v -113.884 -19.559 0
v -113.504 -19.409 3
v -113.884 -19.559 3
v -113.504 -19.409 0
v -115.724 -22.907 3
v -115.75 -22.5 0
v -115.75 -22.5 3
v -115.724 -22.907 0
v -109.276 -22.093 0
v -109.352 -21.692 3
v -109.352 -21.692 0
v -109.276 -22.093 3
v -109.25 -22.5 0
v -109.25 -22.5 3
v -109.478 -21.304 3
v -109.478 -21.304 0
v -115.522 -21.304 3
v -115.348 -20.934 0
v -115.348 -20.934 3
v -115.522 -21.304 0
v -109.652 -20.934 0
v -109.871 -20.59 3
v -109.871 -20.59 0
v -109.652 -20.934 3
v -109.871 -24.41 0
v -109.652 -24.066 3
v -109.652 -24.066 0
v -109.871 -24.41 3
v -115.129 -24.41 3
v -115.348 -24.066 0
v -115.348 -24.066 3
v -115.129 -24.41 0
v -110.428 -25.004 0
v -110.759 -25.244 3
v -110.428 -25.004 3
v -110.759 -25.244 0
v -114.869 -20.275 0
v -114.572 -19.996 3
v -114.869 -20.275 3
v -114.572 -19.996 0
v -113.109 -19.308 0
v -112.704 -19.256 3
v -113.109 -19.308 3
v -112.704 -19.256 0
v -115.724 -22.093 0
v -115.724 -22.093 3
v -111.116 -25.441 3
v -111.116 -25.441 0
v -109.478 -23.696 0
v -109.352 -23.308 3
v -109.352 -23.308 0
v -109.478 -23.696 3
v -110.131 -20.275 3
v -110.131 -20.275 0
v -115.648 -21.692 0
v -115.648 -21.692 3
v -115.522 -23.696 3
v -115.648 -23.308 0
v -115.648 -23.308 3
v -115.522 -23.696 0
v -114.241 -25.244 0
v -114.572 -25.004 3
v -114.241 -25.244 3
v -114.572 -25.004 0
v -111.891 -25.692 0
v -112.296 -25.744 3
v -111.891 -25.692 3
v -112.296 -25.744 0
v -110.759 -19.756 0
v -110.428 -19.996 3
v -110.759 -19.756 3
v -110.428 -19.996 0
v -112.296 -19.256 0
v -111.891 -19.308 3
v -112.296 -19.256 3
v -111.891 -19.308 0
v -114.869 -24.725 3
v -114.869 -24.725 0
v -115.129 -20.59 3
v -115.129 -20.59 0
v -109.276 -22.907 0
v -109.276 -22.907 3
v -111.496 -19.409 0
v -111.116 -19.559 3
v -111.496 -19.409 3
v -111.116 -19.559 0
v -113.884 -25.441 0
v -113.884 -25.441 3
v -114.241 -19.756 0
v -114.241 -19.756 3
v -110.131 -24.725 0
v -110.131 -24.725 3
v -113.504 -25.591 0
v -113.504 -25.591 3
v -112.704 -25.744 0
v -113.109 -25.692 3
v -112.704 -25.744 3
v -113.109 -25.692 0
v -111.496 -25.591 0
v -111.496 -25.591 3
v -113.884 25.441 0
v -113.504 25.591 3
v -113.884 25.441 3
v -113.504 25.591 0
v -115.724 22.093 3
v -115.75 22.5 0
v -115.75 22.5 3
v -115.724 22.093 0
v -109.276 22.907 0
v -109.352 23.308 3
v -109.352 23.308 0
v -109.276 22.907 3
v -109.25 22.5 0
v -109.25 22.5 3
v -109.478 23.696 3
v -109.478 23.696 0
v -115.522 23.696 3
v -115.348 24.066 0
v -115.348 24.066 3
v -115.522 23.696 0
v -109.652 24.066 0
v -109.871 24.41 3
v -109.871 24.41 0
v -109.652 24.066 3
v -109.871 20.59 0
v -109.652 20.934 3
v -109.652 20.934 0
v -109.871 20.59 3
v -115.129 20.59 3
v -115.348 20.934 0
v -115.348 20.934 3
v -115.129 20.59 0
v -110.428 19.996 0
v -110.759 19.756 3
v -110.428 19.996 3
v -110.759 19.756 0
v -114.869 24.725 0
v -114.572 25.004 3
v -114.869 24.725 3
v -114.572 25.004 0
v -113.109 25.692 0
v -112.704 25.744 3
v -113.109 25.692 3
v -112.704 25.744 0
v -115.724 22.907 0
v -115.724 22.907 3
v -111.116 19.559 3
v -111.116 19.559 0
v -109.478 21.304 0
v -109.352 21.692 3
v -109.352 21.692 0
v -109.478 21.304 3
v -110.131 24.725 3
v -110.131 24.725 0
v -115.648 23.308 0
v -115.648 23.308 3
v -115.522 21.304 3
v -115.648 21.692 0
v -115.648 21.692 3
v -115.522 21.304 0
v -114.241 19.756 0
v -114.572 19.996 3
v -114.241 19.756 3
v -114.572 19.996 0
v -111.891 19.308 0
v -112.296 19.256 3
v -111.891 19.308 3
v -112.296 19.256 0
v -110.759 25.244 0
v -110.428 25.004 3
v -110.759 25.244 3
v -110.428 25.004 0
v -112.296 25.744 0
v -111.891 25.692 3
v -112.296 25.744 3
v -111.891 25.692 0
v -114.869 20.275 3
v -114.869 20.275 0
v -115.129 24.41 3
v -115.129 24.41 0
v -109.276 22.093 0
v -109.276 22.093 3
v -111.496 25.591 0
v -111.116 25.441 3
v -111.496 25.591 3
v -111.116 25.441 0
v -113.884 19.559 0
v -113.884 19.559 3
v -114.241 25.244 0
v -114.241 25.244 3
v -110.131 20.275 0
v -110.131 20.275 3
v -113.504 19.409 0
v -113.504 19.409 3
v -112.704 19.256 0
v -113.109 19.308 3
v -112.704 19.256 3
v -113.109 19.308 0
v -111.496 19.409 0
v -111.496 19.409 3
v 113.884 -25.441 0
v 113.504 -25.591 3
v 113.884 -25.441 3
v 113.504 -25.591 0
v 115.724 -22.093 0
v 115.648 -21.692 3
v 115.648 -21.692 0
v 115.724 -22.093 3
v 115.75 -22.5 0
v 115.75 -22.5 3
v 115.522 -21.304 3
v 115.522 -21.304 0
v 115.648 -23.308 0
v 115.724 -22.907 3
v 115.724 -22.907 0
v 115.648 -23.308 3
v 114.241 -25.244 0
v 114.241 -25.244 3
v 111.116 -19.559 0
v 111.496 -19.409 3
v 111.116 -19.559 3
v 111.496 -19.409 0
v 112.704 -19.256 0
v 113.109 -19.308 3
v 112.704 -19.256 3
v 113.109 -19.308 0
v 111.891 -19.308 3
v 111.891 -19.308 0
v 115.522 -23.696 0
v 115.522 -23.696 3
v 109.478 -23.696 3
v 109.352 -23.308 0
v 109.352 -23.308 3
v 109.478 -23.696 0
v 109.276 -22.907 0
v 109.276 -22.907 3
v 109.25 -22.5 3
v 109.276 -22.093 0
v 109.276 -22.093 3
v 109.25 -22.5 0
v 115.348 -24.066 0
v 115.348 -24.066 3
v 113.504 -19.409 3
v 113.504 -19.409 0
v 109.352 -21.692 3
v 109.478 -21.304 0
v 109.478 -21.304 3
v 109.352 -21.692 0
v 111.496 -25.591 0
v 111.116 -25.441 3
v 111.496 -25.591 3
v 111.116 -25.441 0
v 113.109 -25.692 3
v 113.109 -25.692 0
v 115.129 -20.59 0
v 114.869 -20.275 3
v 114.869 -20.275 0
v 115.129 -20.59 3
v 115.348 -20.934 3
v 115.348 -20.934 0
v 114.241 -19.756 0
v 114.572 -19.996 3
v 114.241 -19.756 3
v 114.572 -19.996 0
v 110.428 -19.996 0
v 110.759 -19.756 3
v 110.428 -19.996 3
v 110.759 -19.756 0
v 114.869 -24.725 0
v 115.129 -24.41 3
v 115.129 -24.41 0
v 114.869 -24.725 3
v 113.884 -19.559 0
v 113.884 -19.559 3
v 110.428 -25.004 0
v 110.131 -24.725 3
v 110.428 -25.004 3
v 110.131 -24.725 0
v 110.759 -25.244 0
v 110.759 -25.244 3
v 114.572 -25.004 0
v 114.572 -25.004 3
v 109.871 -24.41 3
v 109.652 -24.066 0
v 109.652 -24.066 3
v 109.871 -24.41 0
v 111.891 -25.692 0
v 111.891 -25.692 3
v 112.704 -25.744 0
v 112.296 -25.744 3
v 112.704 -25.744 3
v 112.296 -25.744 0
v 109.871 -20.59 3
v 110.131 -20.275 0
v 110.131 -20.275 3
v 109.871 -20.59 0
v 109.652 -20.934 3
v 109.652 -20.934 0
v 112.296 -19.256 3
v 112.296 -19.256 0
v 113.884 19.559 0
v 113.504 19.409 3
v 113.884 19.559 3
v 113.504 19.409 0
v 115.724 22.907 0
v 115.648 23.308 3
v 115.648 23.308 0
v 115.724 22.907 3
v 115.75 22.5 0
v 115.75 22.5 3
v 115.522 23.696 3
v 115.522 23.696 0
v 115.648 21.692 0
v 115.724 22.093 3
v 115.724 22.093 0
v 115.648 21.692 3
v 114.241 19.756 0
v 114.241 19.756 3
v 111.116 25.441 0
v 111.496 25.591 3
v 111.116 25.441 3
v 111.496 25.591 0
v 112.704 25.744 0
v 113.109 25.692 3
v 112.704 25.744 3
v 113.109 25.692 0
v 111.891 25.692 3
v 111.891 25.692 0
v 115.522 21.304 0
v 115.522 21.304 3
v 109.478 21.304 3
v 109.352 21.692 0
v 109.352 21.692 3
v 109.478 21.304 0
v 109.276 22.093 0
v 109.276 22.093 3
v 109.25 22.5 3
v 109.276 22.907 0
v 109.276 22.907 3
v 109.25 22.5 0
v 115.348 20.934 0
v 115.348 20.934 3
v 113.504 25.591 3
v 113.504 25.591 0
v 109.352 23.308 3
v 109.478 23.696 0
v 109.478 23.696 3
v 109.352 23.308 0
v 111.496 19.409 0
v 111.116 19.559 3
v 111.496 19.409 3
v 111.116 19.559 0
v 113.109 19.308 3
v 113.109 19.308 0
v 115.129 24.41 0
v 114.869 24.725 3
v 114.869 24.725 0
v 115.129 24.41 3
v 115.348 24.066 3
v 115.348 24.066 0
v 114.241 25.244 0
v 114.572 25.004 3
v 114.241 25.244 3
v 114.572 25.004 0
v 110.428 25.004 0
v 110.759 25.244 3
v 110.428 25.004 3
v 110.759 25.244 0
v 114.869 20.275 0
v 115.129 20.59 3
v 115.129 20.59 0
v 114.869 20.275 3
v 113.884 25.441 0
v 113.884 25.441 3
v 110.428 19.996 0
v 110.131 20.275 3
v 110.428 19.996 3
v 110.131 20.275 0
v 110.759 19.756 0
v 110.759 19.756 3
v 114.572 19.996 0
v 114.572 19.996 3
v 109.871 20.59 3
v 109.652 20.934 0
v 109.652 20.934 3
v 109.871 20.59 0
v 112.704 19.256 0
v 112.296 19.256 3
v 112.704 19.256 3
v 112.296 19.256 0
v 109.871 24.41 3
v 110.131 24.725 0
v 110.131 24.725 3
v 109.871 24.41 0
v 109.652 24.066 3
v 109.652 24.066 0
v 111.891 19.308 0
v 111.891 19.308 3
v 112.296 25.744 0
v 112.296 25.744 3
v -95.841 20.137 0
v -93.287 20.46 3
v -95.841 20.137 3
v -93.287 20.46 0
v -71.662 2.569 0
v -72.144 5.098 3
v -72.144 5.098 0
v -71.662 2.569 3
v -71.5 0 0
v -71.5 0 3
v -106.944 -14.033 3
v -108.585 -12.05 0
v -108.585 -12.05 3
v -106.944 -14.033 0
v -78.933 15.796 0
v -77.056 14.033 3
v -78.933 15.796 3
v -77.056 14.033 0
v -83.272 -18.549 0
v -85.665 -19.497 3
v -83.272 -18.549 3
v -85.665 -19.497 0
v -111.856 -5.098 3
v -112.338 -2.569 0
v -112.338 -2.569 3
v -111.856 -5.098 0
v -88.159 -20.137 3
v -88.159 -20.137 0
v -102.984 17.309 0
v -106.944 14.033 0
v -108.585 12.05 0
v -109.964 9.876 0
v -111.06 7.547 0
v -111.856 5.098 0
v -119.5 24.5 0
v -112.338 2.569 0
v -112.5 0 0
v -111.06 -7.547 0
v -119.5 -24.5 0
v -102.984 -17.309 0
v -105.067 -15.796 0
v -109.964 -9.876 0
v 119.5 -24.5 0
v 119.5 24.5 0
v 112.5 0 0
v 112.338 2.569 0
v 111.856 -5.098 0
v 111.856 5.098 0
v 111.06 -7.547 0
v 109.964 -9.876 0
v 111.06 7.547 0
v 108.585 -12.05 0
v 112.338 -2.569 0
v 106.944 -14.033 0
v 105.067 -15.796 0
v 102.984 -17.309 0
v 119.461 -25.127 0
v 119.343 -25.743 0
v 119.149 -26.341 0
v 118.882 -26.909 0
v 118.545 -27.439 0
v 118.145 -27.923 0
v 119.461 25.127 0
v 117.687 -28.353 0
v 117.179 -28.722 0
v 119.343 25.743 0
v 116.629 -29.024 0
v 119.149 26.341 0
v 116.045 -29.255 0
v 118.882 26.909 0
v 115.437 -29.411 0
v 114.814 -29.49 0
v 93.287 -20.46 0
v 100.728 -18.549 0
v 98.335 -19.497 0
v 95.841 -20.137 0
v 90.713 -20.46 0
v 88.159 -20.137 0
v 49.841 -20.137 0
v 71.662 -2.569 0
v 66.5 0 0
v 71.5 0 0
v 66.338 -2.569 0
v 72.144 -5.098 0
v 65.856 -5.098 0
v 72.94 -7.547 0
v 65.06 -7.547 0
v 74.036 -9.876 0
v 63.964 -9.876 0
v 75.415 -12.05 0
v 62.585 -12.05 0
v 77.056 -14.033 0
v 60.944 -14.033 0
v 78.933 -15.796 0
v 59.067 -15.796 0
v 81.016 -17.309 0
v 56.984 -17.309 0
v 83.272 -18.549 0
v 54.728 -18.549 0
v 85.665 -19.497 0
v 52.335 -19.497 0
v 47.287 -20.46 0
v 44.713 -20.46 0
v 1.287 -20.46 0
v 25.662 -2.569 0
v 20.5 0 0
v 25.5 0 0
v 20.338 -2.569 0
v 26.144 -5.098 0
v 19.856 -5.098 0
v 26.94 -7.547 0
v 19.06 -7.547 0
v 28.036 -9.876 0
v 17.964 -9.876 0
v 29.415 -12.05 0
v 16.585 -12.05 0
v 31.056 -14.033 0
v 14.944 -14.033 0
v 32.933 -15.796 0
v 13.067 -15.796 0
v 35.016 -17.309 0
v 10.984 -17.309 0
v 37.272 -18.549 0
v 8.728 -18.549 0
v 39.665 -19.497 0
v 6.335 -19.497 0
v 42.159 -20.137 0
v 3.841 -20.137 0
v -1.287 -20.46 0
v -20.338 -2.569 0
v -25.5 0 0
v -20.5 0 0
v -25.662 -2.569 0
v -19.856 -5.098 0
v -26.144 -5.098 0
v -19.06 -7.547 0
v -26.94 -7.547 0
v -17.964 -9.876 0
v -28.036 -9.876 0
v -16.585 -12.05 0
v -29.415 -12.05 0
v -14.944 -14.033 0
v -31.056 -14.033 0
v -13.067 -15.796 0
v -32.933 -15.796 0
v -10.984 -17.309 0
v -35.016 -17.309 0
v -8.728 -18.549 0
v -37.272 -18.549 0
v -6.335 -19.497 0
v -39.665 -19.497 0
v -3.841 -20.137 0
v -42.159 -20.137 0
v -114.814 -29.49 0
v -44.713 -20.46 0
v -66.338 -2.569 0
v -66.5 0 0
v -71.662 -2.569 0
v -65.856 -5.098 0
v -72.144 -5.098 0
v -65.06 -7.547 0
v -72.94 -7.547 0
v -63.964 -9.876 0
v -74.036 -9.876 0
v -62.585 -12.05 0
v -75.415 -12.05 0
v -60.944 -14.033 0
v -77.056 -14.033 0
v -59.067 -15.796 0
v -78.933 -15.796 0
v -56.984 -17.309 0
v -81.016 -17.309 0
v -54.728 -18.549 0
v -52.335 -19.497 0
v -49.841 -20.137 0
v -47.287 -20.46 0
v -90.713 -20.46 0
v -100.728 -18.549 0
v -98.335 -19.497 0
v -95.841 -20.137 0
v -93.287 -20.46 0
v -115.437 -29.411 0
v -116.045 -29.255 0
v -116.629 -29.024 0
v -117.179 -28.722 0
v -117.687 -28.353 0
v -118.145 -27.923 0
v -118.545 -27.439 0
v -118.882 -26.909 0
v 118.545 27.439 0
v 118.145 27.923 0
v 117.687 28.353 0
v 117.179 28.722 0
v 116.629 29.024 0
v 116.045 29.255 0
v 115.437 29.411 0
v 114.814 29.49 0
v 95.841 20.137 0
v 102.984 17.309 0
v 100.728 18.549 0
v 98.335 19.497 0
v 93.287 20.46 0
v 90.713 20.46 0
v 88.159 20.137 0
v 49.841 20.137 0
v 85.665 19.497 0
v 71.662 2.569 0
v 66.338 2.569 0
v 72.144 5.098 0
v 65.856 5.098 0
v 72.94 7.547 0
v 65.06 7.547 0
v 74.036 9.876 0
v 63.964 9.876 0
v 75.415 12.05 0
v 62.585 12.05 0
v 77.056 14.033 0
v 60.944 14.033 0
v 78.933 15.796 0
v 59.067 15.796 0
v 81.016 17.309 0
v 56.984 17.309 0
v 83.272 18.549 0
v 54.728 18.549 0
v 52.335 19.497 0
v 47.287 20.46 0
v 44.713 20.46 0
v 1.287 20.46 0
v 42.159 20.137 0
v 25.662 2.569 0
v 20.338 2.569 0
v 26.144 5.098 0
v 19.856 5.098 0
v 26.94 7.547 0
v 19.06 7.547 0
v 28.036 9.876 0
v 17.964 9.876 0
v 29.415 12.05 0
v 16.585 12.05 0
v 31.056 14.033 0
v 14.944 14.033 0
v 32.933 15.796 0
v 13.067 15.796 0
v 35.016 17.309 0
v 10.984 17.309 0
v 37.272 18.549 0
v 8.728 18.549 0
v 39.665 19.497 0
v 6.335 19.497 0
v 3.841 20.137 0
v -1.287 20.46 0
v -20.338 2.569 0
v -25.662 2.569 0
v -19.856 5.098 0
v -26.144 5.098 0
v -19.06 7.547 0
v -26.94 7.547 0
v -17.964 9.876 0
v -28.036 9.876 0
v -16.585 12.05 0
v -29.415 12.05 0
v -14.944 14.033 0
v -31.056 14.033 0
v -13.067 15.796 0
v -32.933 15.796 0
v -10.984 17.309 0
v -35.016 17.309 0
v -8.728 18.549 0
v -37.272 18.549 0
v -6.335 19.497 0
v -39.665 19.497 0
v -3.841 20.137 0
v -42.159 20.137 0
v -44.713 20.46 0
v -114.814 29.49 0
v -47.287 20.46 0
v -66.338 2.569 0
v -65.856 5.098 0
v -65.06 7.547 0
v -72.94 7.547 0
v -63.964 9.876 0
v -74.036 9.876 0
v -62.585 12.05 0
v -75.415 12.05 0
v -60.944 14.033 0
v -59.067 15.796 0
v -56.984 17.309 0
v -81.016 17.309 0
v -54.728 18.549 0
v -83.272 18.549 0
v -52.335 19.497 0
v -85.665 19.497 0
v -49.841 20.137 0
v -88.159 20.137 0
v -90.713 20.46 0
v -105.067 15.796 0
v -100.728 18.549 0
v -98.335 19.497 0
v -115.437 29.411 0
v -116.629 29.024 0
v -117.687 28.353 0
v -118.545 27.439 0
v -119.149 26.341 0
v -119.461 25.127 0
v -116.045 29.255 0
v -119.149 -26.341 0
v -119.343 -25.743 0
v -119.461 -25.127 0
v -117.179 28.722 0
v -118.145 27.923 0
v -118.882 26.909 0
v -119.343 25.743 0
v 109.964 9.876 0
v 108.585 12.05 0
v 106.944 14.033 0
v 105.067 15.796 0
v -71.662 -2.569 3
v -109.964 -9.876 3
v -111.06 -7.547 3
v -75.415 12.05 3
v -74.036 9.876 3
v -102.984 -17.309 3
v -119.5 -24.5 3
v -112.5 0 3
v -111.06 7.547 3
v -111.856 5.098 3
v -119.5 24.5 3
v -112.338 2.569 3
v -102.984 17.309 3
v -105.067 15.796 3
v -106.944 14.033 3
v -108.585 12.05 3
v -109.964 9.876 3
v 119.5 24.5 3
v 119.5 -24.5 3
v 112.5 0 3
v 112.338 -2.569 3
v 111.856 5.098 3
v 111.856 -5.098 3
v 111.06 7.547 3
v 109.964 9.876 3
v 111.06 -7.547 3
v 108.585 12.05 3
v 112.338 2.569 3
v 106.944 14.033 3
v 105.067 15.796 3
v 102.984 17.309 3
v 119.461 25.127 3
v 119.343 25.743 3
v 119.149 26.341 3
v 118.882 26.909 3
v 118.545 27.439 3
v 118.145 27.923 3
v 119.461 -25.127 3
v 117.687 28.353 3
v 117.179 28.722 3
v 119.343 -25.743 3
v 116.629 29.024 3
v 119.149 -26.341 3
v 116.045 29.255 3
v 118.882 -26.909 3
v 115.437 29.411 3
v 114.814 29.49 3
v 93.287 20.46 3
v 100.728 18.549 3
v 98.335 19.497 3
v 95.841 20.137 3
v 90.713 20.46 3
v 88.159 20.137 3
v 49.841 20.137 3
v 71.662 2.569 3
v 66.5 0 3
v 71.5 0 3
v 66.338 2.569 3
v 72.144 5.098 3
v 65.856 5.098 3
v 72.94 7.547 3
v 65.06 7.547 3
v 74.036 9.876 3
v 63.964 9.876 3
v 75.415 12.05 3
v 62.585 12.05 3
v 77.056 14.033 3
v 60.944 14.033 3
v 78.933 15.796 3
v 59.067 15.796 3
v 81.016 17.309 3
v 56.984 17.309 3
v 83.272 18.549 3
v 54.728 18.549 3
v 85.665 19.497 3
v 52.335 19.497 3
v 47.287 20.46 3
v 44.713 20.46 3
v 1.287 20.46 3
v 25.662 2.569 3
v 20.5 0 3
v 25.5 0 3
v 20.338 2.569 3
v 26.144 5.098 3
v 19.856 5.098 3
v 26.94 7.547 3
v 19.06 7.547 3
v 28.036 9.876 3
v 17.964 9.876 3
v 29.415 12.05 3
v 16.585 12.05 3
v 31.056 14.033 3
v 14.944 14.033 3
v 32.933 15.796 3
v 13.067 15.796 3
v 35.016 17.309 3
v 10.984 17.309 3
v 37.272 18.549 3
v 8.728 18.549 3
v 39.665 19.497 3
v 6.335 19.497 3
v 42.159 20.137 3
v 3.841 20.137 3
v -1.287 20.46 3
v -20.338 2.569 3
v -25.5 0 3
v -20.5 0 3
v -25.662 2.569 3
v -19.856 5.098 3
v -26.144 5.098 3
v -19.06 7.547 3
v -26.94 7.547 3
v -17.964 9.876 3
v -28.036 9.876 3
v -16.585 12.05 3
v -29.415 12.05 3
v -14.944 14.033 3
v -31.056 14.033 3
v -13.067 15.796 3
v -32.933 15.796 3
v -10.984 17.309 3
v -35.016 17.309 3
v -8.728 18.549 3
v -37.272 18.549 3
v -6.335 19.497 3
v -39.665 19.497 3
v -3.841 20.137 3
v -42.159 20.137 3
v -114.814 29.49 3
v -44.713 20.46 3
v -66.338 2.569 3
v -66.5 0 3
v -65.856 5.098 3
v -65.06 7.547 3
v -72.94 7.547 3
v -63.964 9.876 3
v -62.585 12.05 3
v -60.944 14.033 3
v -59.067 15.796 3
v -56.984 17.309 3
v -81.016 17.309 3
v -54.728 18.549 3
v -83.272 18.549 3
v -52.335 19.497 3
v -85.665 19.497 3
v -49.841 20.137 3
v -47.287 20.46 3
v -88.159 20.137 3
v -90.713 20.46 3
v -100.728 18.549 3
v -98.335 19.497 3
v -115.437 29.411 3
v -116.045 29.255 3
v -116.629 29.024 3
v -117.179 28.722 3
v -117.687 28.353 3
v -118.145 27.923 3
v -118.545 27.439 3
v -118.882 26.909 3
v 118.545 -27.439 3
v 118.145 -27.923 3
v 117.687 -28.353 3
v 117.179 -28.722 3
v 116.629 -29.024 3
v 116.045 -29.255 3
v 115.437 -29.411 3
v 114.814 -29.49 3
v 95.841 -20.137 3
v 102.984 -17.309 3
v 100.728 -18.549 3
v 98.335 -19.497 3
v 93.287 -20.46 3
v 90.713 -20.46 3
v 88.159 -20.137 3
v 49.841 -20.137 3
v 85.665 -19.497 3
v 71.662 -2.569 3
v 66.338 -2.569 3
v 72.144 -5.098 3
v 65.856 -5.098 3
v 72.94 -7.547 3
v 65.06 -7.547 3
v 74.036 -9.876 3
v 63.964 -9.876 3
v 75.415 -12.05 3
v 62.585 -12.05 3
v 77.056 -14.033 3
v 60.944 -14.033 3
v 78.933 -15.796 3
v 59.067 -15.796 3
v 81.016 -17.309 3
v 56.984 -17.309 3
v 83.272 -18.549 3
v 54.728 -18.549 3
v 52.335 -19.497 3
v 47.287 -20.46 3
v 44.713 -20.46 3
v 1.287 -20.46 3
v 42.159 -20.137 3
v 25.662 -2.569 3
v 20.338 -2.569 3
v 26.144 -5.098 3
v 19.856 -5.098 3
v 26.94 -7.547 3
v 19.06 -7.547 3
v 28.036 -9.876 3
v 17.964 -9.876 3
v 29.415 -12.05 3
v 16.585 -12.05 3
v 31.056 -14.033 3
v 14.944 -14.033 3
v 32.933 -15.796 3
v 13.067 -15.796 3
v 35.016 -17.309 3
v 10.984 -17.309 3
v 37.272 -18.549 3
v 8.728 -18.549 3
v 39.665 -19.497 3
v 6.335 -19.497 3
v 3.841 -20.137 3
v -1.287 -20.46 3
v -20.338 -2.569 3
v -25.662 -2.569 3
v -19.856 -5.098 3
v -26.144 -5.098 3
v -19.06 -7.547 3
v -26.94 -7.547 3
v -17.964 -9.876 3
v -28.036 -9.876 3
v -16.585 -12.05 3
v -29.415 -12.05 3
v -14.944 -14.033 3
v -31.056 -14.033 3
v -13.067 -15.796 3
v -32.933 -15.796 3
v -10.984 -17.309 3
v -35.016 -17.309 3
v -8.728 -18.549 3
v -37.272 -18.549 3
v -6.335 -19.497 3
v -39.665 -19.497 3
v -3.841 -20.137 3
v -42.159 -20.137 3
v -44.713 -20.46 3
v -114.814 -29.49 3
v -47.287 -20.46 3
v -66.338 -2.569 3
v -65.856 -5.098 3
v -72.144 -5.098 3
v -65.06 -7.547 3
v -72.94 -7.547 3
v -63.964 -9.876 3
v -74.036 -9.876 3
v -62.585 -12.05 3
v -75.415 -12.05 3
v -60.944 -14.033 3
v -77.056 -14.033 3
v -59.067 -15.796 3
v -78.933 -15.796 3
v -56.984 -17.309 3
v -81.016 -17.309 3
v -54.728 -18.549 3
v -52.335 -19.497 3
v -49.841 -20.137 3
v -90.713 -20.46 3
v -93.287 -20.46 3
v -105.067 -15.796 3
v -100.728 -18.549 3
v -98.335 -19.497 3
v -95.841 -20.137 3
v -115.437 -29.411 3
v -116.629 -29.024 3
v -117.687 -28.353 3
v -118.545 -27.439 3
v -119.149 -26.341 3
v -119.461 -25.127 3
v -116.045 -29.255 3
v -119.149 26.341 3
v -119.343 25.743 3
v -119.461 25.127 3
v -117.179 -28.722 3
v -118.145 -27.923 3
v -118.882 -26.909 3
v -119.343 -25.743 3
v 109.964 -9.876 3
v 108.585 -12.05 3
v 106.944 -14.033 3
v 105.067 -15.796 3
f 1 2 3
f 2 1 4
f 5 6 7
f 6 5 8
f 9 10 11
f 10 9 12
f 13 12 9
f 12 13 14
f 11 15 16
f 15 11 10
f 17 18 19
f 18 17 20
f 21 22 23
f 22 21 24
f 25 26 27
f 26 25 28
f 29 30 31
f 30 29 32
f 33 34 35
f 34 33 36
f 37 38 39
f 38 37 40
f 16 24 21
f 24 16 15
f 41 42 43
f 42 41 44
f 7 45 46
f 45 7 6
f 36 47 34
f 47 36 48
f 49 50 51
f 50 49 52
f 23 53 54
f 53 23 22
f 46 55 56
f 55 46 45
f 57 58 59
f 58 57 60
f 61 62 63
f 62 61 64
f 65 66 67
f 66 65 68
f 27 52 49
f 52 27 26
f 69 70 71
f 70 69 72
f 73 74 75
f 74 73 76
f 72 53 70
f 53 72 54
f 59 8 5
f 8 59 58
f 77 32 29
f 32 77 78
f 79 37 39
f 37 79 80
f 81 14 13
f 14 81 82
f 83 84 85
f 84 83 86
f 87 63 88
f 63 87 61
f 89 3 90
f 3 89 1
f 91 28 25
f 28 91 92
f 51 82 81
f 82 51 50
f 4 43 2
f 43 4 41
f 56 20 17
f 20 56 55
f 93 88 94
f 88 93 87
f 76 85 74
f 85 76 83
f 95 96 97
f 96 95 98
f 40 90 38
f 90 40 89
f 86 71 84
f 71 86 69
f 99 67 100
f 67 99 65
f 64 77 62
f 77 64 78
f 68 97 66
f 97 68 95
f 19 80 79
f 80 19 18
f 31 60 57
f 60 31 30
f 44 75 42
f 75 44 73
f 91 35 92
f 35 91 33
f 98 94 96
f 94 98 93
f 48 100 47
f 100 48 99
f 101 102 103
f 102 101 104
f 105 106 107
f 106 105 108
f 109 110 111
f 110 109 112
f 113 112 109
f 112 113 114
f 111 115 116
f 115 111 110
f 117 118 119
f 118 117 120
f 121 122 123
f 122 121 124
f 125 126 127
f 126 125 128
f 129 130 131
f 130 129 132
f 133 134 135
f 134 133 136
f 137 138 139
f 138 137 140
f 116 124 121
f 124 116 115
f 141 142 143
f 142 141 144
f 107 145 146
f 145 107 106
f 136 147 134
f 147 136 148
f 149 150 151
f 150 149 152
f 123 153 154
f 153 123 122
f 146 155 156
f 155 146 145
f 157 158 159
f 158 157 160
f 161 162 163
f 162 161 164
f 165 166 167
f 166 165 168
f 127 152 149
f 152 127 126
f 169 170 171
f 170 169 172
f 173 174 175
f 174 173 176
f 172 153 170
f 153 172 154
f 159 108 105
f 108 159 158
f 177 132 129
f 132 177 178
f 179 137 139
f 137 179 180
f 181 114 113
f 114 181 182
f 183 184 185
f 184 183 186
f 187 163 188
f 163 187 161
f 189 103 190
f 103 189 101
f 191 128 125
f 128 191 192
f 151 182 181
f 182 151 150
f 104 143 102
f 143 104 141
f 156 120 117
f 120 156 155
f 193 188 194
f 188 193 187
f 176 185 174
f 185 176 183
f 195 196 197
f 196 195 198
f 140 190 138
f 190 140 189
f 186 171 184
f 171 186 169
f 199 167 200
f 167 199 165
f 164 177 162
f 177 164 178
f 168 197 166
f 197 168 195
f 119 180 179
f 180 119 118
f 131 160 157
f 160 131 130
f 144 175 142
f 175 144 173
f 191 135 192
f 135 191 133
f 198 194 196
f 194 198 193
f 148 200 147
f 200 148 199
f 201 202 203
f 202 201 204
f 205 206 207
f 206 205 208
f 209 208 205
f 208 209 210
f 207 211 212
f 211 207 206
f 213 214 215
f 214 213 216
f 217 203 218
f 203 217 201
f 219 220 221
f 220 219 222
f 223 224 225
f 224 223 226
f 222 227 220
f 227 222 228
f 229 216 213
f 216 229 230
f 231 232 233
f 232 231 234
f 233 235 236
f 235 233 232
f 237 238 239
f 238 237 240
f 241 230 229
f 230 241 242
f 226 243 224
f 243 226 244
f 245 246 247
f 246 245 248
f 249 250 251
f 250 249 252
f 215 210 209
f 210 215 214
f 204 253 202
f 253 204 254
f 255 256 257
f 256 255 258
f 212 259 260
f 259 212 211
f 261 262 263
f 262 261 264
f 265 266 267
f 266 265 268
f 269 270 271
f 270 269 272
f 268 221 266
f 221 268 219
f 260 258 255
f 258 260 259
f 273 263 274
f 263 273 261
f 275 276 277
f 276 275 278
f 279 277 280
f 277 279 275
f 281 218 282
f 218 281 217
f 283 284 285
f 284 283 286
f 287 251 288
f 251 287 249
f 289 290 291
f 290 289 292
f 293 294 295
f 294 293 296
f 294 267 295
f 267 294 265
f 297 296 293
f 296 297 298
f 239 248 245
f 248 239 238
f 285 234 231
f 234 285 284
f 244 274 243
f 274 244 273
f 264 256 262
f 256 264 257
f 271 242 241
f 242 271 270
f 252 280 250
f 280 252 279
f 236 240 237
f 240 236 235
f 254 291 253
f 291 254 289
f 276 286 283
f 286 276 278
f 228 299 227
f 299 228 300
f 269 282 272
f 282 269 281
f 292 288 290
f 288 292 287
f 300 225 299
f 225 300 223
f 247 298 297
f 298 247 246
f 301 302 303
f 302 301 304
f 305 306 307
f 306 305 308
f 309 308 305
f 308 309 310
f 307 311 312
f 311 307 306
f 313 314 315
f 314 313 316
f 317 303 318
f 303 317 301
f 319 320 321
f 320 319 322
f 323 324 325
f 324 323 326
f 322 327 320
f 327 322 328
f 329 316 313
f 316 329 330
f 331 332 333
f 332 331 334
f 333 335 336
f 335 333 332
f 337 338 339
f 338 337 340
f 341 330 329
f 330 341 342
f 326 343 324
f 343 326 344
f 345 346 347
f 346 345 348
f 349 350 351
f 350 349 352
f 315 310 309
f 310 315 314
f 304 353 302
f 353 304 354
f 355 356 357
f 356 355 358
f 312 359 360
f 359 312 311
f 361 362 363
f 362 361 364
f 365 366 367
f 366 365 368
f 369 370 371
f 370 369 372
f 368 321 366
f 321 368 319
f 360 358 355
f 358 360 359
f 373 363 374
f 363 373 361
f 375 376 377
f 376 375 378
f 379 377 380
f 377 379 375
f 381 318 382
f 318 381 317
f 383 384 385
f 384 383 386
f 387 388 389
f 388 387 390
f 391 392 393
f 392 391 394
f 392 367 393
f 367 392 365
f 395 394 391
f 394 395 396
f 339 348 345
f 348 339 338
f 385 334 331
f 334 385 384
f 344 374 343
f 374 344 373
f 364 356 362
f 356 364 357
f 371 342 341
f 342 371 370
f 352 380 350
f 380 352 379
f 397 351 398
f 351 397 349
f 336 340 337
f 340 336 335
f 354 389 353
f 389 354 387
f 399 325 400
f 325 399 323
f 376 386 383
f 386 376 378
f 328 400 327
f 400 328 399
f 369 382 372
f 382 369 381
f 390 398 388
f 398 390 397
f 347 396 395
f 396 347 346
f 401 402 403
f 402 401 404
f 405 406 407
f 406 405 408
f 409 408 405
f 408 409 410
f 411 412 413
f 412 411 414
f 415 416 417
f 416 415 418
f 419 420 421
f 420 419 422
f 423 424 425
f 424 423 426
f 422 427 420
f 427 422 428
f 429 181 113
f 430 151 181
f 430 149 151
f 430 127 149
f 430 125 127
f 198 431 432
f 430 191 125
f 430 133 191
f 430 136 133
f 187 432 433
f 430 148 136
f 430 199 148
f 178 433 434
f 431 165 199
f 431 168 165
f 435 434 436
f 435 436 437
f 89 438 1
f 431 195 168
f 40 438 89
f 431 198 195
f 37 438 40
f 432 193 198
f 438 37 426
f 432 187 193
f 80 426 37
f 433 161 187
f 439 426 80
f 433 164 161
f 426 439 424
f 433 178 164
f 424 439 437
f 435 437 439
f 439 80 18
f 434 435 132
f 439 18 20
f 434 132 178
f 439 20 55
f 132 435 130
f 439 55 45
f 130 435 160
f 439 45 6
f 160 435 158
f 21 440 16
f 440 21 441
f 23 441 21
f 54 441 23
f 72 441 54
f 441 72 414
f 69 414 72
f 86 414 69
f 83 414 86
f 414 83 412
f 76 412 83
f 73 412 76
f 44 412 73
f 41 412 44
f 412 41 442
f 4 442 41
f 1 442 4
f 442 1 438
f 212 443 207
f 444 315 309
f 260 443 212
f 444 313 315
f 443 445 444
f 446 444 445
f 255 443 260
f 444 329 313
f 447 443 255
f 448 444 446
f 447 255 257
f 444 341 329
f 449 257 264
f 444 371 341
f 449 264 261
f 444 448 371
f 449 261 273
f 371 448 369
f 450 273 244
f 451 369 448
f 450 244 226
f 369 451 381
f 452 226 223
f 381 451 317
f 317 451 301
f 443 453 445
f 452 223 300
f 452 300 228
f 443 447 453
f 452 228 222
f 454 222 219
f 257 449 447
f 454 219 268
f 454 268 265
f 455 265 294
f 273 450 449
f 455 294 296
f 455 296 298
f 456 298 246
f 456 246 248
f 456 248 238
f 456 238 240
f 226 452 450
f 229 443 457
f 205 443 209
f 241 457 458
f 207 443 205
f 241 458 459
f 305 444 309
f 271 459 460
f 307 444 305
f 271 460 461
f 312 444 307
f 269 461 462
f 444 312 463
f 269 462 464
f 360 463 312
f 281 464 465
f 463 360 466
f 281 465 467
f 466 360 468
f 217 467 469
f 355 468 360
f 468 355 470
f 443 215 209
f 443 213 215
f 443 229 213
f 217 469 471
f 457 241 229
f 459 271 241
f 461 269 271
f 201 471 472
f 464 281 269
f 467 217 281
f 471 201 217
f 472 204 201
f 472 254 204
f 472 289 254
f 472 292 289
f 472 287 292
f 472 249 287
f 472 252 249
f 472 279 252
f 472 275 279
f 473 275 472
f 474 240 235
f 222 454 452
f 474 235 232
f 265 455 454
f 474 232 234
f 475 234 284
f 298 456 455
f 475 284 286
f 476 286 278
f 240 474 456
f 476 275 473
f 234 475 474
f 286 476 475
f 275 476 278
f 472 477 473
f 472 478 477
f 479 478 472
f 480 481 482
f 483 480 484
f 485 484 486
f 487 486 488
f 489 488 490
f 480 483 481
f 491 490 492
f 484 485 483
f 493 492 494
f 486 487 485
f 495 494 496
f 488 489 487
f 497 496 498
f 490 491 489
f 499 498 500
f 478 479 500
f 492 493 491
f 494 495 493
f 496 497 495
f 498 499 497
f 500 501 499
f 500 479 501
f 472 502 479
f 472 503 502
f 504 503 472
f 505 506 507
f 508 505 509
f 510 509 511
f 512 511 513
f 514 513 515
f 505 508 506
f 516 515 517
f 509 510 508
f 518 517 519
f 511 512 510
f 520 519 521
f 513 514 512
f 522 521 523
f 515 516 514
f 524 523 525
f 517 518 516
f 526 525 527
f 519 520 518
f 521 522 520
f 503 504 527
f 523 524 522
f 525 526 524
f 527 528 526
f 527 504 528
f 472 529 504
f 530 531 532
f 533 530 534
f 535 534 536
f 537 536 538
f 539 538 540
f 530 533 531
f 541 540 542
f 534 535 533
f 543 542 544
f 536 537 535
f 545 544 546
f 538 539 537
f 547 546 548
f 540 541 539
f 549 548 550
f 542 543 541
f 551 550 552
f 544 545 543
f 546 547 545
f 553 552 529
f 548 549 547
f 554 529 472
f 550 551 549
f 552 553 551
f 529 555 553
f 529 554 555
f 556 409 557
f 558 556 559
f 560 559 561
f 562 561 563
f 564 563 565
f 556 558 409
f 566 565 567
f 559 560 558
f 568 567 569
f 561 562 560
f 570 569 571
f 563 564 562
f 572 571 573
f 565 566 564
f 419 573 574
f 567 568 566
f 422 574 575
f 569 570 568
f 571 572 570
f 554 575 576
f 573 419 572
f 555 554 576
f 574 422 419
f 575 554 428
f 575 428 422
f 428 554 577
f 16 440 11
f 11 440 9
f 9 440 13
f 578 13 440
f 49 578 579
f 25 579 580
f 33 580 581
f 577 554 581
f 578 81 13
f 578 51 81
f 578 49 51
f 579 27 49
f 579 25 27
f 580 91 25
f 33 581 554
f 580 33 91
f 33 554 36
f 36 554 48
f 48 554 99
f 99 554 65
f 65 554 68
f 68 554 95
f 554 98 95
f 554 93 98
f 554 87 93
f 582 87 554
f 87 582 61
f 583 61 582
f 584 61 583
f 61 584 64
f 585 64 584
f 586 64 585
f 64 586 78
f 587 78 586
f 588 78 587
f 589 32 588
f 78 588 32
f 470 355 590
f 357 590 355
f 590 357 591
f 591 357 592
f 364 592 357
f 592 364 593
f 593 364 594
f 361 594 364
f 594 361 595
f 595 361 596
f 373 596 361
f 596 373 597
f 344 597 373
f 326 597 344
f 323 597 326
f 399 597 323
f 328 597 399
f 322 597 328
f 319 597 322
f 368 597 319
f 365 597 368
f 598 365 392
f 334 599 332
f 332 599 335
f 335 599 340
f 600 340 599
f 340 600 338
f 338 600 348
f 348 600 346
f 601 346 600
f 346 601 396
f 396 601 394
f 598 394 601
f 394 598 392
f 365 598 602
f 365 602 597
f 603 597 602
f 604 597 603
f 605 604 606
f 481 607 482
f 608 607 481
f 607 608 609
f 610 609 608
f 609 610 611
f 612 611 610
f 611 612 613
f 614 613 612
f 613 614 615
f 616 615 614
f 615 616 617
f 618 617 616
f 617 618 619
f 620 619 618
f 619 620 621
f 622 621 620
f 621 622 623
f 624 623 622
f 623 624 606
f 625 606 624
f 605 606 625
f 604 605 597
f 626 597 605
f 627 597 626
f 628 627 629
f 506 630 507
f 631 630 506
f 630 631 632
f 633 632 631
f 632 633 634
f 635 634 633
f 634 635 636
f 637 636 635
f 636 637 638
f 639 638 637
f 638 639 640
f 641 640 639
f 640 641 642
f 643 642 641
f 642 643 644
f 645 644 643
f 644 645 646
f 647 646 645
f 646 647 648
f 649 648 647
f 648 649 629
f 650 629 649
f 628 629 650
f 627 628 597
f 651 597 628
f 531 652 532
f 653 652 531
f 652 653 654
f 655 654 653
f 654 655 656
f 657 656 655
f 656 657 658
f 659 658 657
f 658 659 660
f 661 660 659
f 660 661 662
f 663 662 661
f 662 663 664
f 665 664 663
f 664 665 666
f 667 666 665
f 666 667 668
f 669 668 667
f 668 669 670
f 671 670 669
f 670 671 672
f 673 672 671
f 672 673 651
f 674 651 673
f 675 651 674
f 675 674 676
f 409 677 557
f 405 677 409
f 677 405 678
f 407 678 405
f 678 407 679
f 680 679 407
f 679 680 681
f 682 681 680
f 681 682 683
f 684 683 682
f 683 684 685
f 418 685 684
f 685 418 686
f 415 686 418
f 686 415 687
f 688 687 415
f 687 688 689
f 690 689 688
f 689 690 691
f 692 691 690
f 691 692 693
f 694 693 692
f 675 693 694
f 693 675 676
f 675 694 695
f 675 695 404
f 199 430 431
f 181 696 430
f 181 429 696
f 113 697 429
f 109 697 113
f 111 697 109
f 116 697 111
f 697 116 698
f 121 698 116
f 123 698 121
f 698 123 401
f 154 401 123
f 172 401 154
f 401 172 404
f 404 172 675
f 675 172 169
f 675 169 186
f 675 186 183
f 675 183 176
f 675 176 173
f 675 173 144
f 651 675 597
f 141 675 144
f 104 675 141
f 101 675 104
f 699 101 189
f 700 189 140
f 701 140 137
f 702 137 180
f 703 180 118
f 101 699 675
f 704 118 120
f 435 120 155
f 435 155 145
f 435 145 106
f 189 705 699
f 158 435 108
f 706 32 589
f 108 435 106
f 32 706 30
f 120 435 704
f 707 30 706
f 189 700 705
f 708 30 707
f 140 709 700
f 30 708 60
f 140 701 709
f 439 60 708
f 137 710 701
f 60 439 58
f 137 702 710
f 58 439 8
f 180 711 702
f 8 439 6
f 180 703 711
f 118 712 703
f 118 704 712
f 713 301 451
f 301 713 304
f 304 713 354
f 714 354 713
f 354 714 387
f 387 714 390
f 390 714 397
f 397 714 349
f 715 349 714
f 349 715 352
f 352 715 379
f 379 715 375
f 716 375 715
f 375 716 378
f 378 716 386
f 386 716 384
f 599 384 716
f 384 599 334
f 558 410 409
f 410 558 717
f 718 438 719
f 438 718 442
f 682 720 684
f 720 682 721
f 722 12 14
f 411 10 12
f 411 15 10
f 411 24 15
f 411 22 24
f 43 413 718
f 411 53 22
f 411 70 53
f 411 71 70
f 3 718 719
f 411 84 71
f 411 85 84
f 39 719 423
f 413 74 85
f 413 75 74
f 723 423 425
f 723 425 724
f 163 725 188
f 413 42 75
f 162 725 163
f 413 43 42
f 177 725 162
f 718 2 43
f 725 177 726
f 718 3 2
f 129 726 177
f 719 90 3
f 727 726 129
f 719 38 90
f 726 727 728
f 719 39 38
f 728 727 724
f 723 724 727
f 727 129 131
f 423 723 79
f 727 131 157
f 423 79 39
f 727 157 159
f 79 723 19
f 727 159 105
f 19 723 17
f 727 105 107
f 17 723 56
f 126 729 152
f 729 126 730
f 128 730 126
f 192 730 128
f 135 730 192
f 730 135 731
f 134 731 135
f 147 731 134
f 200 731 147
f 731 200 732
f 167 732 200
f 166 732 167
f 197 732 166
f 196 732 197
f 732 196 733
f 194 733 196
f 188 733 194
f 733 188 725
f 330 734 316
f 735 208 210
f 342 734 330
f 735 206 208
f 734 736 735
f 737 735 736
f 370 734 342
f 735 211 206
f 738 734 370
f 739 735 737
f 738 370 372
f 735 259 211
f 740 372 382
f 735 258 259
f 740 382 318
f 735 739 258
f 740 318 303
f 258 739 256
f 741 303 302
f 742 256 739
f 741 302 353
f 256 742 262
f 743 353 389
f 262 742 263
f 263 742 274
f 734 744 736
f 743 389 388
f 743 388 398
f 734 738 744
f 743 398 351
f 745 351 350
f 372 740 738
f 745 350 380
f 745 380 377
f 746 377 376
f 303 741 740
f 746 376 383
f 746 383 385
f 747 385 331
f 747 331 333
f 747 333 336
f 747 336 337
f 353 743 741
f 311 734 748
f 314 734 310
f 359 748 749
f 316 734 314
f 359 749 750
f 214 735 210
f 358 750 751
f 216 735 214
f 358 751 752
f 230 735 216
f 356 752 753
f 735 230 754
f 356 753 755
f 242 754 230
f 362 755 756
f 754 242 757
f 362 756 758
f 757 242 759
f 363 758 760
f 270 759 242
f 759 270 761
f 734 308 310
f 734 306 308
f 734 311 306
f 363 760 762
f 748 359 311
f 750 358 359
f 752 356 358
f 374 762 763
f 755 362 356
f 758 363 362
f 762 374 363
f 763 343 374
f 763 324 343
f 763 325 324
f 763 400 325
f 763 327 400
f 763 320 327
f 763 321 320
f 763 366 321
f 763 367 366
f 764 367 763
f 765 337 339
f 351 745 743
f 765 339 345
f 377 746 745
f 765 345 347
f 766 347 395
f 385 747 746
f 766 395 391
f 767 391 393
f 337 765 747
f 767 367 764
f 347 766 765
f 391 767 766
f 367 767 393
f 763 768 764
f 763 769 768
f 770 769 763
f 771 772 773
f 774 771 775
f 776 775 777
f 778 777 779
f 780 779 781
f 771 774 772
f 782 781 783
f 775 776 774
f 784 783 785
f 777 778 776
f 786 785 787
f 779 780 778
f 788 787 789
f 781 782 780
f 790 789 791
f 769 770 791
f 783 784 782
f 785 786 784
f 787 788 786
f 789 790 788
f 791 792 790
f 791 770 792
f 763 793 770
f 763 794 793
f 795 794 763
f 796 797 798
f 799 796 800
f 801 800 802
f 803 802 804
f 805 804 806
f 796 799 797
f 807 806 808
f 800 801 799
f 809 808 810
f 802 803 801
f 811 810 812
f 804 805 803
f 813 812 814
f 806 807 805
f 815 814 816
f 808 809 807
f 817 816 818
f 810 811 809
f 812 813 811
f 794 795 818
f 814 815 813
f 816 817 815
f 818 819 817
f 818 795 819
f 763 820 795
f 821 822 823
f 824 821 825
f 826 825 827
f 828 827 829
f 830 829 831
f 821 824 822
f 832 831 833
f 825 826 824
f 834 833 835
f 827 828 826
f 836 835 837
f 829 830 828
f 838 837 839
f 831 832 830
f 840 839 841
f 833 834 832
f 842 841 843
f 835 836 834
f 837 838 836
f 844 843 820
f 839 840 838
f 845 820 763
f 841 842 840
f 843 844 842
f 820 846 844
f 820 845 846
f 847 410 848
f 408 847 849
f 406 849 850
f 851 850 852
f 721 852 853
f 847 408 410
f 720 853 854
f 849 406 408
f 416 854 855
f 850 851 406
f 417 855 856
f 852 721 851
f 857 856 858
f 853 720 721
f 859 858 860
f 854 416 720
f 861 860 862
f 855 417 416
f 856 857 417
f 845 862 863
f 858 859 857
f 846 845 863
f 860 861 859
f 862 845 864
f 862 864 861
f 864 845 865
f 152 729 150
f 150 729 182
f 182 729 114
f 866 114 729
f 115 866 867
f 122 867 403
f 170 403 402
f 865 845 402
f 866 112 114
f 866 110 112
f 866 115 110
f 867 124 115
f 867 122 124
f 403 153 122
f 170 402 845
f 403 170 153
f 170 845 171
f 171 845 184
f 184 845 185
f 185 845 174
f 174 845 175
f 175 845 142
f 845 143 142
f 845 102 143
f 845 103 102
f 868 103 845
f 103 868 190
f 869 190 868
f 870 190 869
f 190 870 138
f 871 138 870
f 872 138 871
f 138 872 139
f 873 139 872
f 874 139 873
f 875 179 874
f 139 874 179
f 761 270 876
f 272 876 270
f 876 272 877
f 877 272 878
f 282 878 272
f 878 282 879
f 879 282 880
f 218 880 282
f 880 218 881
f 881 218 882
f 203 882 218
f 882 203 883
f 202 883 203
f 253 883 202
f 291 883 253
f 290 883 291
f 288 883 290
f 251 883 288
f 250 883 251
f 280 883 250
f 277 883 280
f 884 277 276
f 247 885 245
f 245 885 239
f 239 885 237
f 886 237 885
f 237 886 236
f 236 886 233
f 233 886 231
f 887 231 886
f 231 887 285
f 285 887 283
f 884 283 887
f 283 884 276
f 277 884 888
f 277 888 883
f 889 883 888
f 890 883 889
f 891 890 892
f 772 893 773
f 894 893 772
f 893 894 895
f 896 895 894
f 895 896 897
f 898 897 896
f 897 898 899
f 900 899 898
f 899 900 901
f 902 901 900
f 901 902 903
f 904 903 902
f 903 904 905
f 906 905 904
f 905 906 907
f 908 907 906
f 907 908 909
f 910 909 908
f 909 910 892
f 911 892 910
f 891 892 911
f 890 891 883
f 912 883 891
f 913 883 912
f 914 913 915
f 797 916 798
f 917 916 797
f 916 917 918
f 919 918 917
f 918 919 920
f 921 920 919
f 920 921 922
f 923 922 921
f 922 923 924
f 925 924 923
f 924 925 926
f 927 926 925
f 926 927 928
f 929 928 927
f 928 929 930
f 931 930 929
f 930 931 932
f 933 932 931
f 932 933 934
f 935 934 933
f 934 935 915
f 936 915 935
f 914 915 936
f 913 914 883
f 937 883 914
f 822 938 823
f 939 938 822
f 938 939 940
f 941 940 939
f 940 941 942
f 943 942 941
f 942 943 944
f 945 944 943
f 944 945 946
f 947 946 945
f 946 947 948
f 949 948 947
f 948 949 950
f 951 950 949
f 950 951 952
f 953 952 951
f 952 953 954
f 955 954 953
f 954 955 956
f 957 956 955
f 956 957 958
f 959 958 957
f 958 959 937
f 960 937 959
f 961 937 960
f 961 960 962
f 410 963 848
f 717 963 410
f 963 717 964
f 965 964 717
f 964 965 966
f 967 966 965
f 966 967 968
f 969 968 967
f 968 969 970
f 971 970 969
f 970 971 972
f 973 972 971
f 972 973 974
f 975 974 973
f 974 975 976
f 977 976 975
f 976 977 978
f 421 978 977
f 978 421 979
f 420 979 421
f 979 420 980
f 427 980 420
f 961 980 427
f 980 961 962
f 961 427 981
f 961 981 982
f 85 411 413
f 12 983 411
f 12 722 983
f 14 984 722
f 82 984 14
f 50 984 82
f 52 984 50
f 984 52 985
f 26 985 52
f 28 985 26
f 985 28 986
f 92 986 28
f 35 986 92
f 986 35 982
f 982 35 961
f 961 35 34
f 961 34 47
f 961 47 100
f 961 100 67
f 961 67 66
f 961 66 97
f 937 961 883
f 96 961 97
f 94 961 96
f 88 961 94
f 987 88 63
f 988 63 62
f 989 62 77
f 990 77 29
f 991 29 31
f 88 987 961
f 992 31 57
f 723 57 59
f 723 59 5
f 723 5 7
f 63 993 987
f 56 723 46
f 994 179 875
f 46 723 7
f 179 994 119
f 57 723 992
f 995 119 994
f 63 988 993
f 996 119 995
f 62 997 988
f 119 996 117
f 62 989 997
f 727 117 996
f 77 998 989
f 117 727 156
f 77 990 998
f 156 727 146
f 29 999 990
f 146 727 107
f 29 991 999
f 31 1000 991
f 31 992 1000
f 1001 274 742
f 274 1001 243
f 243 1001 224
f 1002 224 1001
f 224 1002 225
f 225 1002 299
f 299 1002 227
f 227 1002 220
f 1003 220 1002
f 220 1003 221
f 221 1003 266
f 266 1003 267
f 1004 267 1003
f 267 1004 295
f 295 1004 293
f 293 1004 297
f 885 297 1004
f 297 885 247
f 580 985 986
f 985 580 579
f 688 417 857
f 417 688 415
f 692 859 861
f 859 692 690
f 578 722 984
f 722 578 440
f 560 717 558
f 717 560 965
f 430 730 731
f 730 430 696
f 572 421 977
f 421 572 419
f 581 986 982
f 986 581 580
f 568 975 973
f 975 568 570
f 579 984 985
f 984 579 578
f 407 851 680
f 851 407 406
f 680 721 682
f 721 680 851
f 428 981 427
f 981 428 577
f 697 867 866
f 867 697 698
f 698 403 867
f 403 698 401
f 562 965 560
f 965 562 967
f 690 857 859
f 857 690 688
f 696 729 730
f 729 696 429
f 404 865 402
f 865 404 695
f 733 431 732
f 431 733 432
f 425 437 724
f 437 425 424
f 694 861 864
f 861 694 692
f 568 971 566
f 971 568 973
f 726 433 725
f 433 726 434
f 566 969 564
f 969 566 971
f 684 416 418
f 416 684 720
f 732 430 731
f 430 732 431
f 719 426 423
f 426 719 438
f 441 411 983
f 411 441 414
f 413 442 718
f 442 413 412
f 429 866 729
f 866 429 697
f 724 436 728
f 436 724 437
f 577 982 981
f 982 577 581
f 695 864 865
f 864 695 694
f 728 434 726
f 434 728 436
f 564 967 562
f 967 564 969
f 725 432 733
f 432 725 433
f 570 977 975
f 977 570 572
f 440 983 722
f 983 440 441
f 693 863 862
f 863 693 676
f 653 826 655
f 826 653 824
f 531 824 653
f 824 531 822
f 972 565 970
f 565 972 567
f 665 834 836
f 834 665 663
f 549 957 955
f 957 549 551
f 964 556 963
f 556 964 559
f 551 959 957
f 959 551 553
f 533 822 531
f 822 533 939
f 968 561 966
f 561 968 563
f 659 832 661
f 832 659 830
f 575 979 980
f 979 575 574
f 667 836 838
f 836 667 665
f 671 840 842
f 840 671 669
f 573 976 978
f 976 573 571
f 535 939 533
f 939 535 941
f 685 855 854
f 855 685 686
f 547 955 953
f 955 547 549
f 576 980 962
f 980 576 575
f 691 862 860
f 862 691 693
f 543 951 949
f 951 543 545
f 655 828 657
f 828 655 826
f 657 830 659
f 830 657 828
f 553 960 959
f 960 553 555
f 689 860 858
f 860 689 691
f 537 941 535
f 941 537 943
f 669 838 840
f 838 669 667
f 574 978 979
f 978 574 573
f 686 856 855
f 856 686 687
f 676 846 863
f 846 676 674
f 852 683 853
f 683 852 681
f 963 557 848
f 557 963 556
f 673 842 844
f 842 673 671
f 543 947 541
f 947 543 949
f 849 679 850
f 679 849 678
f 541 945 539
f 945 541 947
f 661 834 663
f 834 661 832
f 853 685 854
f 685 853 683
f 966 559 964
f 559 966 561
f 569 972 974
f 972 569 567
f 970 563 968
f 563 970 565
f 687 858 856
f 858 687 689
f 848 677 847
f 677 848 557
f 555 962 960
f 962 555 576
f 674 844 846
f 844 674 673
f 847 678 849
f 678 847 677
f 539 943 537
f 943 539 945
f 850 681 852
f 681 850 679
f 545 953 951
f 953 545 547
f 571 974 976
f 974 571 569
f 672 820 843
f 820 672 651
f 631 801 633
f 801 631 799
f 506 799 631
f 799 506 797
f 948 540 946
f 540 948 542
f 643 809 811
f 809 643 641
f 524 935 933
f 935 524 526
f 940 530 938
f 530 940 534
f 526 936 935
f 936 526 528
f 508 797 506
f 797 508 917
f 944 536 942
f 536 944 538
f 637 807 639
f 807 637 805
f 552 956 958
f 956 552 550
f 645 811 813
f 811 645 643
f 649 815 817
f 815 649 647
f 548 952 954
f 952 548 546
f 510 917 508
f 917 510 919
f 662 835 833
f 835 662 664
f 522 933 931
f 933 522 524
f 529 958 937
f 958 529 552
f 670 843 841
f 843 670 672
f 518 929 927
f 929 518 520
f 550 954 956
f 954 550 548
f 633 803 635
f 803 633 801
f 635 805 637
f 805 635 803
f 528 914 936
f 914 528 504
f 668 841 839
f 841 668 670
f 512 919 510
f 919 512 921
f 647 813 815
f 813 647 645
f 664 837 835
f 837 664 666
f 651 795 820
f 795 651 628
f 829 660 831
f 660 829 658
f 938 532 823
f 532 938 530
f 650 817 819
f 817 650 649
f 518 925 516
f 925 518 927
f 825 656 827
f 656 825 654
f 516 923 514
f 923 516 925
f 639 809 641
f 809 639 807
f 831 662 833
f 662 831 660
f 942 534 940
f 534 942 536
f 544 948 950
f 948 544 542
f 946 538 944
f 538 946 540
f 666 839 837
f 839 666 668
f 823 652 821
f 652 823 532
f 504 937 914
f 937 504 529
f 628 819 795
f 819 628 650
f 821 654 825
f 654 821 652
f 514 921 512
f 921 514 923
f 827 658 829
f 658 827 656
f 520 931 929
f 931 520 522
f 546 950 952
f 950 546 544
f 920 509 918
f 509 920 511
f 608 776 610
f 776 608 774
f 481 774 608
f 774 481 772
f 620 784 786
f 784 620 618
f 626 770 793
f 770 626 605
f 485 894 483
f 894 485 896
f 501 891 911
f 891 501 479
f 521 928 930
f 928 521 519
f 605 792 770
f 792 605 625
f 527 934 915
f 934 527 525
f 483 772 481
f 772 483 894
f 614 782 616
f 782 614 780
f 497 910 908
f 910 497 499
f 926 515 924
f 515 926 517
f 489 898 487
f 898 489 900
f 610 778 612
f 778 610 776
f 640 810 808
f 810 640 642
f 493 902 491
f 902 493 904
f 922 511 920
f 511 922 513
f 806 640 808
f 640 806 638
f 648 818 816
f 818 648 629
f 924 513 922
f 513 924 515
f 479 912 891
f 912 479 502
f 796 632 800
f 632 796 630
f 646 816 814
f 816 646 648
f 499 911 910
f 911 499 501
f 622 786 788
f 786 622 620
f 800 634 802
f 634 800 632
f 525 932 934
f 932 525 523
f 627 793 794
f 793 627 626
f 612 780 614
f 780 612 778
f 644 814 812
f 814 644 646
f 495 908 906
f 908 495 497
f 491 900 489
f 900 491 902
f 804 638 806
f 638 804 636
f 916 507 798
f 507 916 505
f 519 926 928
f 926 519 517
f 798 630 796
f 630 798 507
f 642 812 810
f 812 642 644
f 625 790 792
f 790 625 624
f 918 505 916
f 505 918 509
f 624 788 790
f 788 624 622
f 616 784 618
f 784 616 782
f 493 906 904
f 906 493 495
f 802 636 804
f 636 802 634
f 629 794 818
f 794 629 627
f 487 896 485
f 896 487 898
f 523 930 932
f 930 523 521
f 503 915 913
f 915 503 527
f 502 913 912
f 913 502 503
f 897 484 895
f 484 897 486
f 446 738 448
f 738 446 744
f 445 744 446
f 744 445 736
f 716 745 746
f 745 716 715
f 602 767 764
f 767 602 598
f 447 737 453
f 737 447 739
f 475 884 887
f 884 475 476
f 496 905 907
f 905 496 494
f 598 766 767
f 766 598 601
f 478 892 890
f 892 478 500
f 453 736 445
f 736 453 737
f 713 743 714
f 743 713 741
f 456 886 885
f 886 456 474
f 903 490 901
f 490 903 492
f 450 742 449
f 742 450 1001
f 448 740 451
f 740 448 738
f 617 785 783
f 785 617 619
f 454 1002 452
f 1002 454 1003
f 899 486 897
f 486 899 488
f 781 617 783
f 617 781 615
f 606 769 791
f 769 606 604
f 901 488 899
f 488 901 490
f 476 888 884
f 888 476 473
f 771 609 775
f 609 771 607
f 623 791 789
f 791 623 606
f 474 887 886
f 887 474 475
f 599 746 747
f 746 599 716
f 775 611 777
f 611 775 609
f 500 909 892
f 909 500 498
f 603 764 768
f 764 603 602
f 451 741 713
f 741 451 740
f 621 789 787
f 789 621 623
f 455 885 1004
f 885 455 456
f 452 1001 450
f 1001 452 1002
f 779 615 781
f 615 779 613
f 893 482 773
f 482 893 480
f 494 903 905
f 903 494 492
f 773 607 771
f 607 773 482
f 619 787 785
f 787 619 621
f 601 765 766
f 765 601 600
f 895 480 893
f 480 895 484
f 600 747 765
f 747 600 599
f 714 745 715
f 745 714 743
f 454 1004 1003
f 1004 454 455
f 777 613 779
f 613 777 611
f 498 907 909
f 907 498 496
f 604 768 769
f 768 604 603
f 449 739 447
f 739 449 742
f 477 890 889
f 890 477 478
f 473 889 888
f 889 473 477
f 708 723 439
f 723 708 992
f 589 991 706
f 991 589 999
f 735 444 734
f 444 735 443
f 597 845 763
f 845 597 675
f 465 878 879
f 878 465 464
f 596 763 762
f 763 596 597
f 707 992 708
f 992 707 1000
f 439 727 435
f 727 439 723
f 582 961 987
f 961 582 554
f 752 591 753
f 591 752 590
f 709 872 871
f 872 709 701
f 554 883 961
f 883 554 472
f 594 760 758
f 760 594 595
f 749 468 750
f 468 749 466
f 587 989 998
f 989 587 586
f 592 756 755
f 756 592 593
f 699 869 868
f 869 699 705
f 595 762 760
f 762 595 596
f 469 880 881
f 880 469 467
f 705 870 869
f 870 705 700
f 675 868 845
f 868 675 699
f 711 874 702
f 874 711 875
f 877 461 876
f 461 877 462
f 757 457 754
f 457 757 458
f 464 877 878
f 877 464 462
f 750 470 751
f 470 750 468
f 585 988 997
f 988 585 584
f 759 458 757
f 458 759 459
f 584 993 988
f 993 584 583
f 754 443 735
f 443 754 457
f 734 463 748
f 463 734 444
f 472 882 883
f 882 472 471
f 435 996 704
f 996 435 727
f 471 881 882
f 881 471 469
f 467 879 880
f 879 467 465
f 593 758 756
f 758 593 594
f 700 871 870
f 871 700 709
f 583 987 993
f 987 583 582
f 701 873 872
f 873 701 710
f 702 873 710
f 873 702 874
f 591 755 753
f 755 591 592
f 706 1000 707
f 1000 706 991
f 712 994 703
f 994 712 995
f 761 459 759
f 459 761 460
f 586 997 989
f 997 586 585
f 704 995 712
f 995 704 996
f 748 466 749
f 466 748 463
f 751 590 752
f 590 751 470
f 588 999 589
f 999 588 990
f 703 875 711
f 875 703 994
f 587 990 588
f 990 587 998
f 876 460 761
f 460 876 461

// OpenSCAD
$fn = 50;


difference() {
	union() {
		hull() {
			translate(v = [-114.5000000000, 24.5000000000, 0]) {
				cylinder(h = 3, r = 5);
			}
			translate(v = [114.5000000000, 24.5000000000, 0]) {
				cylinder(h = 3, r = 5);
			}
			translate(v = [-114.5000000000, -24.5000000000, 0]) {
				cylinder(h = 3, r = 5);
			}
			translate(v = [114.5000000000, -24.5000000000, 0]) {
				cylinder(h = 3, r = 5);
			}
		}
	}
	union() {
		#translate(v = [-112.5000000000, -22.5000000000, -100.0000000000]) {
			cylinder(h = 200, r = 3.2500000000);
		}
		#translate(v = [-112.5000000000, 22.5000000000, -100.0000000000]) {
			cylinder(h = 200, r = 3.2500000000);
		}
		#translate(v = [112.5000000000, -22.5000000000, -100.0000000000]) {
			cylinder(h = 200, r = 3.2500000000);
		}
		#translate(v = [112.5000000000, 22.5000000000, -100.0000000000]) {
			cylinder(h = 200, r = 3.2500000000);
		}
		#translate(v = [-92.0000000000, 0, 0]) {
			cylinder(h = 3, r = 20.5000000000);
		}
		#translate(v = [-46.0000000000, 0, 0]) {
			cylinder(h = 3, r = 20.5000000000);
		}
		#cylinder(h = 3, r = 20.5000000000);
		#translate(v = [46.0000000000, 0, 0]) {
			cylinder(h = 3, r = 20.5000000000);
		}
		#translate(v = [92.0000000000, 0, 0]) {
			cylinder(h = 3, r = 20.5000000000);
		}
	}
}
